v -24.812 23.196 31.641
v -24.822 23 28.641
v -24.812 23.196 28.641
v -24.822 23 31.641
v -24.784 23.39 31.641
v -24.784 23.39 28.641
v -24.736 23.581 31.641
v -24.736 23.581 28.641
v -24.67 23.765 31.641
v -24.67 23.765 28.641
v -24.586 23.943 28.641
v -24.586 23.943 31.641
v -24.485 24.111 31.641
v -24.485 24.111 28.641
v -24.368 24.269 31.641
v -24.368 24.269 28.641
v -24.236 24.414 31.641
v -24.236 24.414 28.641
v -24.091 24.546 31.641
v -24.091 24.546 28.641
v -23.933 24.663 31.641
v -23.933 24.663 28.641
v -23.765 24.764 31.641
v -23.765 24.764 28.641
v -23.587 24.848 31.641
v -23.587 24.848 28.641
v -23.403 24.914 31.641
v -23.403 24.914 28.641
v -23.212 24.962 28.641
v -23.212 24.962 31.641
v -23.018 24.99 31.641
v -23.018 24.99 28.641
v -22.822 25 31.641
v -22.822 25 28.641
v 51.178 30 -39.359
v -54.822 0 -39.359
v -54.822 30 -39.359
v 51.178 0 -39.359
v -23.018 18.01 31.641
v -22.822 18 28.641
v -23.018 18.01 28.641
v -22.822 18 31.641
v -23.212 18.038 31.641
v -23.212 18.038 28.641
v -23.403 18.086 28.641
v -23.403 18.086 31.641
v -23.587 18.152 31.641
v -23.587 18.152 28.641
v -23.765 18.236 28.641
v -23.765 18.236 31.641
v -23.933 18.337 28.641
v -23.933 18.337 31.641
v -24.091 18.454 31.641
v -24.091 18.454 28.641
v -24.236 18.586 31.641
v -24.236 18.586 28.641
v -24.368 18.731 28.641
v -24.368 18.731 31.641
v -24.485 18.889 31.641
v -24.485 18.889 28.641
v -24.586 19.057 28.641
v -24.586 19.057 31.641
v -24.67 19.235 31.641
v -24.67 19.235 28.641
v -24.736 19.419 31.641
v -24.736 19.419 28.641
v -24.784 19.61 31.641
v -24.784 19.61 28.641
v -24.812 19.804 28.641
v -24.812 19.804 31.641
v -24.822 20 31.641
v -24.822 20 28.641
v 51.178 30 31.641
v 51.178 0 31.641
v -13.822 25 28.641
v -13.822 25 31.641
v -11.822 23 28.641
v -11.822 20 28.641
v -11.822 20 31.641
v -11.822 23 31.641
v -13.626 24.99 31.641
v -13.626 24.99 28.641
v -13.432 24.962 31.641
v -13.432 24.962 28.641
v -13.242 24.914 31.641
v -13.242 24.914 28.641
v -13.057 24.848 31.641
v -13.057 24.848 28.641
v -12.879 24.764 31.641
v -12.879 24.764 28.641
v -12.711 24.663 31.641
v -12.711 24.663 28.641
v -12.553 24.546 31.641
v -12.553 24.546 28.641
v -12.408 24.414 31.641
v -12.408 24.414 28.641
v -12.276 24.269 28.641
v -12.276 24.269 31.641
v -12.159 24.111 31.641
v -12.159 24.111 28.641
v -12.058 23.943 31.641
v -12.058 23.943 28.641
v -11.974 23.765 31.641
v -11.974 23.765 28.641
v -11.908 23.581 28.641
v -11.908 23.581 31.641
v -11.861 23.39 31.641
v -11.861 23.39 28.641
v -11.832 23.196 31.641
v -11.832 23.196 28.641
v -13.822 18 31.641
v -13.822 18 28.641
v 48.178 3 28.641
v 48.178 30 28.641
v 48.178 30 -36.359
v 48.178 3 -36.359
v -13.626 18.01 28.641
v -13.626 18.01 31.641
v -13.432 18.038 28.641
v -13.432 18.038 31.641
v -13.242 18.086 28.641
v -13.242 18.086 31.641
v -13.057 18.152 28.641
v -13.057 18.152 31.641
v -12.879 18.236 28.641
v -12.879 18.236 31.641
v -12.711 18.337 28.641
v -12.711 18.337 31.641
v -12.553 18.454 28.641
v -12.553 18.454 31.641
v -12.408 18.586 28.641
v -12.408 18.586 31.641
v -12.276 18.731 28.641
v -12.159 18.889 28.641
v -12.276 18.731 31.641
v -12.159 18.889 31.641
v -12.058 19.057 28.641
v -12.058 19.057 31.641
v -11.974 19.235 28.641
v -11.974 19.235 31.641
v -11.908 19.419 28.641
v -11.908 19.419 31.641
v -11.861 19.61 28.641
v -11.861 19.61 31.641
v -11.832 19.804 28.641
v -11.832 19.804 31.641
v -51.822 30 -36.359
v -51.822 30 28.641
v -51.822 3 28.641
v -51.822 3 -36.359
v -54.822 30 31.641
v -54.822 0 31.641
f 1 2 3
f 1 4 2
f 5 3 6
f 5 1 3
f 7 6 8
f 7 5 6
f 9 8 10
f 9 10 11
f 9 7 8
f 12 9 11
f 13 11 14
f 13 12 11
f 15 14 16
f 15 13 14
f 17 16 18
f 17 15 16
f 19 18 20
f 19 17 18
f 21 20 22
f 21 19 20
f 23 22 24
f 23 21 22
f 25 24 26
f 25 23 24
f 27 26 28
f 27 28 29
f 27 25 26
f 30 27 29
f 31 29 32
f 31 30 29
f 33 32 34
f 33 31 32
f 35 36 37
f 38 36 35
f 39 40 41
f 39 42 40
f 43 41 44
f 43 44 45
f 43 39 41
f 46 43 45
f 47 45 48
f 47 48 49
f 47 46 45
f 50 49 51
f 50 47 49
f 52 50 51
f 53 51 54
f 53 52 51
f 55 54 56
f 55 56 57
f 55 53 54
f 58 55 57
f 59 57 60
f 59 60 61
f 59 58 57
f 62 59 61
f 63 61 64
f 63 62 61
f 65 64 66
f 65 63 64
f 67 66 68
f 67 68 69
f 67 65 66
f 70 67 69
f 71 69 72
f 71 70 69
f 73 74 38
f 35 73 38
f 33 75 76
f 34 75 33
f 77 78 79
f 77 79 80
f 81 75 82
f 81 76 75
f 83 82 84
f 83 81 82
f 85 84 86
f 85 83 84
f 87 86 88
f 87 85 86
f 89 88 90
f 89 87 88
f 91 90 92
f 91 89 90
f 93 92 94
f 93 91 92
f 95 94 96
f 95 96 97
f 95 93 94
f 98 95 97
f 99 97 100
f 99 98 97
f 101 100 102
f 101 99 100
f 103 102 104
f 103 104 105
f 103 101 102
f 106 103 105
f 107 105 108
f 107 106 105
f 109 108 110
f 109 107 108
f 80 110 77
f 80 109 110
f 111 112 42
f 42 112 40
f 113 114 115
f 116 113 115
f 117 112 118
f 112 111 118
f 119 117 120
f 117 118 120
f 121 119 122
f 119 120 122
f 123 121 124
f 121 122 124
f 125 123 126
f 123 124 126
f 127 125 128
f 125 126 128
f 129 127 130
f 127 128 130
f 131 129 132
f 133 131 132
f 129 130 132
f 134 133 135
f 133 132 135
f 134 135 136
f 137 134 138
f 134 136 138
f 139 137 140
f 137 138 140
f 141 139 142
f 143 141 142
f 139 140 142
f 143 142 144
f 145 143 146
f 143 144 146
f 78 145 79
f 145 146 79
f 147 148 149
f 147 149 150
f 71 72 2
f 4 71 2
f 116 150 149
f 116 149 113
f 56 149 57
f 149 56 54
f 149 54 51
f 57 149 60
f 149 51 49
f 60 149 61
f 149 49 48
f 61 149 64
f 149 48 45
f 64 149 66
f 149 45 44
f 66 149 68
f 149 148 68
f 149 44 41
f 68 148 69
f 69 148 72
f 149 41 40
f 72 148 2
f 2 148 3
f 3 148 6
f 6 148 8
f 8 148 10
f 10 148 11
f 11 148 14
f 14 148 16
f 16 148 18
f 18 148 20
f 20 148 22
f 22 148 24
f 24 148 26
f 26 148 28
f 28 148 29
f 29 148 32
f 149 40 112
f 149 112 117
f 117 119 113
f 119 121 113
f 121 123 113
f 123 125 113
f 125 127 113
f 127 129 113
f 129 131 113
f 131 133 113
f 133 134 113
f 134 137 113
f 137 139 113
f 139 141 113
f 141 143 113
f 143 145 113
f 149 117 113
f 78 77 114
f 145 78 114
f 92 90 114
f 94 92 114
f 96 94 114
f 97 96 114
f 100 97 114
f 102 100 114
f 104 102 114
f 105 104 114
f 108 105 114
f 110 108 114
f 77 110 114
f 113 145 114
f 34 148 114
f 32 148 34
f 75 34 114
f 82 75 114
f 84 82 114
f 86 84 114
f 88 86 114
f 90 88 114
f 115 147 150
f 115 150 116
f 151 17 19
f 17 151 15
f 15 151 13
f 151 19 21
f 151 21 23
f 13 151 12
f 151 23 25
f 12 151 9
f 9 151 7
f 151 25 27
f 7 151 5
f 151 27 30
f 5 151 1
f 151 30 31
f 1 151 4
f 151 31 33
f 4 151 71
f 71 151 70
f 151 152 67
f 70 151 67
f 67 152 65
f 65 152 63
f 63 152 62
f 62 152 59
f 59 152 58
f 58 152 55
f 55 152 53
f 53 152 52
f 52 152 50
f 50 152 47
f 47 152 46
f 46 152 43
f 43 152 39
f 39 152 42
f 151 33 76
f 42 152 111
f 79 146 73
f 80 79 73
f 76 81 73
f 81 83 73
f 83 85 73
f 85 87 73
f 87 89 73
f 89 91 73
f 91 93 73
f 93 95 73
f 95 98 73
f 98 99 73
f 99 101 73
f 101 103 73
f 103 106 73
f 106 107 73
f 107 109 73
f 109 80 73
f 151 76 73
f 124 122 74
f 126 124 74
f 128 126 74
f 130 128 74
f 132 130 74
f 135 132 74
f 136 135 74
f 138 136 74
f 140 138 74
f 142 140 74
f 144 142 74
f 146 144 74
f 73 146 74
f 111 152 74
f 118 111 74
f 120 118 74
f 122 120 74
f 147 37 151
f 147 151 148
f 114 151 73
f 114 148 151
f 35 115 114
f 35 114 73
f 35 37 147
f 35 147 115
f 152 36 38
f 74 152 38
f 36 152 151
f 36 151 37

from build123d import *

# Parameters (mm, degrees)
SKETCH1_W           = 106
SKETCH1_H           = 71
BOSS_EXTRUDE1_DEPTH = 30
SKETCH2_W           = 100
SKETCH2_H           = 65
CUT_EXTRUDE1_DEPTH  = 27
SKETCH3_W           = 13
SKETCH3_H           = 7
CUT_EXTRUDE2_DEPTH  = 93.355107755
FILLET1_R           = 2


with BuildPart() as part:
    # Sketch1 → Boss-Extrude1 (new body)
    with BuildSketch(Plane(origin=(0, 0, 0), x_dir=(1, 0, 0), z_dir=(0, 1, 0))):
        with Locations((-1.822129915, 3.859030837)):
            Rectangle(SKETCH1_W, SKETCH1_H)
    extrude(amount=BOSS_EXTRUDE1_DEPTH)

    # Sketch2 → Cut-Extrude1 (cut)
    with BuildSketch(Plane(origin=(0, 30, 0), x_dir=(1, 0, 0), z_dir=(0, 1, 0))):
        with Locations((-1.822129915, 3.859030837)):
            Rectangle(SKETCH2_W, SKETCH2_H)
    extrude(amount=-CUT_EXTRUDE1_DEPTH, mode=Mode.SUBTRACT)

    # Sketch3 → Cut-Extrude2 (cut, through all)
    with BuildSketch(Plane(origin=(0, 0, 28.640969163), x_dir=(-1, 0, 0), z_dir=(0, 0, -1))):
        with Locations((18.322129915, 21.5)):
            Rectangle(SKETCH3_W, SKETCH3_H)
    extrude(amount=-CUT_EXTRUDE2_DEPTH, mode=Mode.SUBTRACT)

    # Fillet1
    fillet1_edges = [part.edges().sort_by_distance(p)[0] for p in [
        (-24.822129915, 25, 30.140969163),
        (-24.822129915, 18, 30.140969163),
        (-11.822129915, 18, 30.140969163),
        (-11.822129915, 25, 30.140969163),
    ]]
    fillet(fillet1_edges, radius=FILLET1_R)


solid = part.part
